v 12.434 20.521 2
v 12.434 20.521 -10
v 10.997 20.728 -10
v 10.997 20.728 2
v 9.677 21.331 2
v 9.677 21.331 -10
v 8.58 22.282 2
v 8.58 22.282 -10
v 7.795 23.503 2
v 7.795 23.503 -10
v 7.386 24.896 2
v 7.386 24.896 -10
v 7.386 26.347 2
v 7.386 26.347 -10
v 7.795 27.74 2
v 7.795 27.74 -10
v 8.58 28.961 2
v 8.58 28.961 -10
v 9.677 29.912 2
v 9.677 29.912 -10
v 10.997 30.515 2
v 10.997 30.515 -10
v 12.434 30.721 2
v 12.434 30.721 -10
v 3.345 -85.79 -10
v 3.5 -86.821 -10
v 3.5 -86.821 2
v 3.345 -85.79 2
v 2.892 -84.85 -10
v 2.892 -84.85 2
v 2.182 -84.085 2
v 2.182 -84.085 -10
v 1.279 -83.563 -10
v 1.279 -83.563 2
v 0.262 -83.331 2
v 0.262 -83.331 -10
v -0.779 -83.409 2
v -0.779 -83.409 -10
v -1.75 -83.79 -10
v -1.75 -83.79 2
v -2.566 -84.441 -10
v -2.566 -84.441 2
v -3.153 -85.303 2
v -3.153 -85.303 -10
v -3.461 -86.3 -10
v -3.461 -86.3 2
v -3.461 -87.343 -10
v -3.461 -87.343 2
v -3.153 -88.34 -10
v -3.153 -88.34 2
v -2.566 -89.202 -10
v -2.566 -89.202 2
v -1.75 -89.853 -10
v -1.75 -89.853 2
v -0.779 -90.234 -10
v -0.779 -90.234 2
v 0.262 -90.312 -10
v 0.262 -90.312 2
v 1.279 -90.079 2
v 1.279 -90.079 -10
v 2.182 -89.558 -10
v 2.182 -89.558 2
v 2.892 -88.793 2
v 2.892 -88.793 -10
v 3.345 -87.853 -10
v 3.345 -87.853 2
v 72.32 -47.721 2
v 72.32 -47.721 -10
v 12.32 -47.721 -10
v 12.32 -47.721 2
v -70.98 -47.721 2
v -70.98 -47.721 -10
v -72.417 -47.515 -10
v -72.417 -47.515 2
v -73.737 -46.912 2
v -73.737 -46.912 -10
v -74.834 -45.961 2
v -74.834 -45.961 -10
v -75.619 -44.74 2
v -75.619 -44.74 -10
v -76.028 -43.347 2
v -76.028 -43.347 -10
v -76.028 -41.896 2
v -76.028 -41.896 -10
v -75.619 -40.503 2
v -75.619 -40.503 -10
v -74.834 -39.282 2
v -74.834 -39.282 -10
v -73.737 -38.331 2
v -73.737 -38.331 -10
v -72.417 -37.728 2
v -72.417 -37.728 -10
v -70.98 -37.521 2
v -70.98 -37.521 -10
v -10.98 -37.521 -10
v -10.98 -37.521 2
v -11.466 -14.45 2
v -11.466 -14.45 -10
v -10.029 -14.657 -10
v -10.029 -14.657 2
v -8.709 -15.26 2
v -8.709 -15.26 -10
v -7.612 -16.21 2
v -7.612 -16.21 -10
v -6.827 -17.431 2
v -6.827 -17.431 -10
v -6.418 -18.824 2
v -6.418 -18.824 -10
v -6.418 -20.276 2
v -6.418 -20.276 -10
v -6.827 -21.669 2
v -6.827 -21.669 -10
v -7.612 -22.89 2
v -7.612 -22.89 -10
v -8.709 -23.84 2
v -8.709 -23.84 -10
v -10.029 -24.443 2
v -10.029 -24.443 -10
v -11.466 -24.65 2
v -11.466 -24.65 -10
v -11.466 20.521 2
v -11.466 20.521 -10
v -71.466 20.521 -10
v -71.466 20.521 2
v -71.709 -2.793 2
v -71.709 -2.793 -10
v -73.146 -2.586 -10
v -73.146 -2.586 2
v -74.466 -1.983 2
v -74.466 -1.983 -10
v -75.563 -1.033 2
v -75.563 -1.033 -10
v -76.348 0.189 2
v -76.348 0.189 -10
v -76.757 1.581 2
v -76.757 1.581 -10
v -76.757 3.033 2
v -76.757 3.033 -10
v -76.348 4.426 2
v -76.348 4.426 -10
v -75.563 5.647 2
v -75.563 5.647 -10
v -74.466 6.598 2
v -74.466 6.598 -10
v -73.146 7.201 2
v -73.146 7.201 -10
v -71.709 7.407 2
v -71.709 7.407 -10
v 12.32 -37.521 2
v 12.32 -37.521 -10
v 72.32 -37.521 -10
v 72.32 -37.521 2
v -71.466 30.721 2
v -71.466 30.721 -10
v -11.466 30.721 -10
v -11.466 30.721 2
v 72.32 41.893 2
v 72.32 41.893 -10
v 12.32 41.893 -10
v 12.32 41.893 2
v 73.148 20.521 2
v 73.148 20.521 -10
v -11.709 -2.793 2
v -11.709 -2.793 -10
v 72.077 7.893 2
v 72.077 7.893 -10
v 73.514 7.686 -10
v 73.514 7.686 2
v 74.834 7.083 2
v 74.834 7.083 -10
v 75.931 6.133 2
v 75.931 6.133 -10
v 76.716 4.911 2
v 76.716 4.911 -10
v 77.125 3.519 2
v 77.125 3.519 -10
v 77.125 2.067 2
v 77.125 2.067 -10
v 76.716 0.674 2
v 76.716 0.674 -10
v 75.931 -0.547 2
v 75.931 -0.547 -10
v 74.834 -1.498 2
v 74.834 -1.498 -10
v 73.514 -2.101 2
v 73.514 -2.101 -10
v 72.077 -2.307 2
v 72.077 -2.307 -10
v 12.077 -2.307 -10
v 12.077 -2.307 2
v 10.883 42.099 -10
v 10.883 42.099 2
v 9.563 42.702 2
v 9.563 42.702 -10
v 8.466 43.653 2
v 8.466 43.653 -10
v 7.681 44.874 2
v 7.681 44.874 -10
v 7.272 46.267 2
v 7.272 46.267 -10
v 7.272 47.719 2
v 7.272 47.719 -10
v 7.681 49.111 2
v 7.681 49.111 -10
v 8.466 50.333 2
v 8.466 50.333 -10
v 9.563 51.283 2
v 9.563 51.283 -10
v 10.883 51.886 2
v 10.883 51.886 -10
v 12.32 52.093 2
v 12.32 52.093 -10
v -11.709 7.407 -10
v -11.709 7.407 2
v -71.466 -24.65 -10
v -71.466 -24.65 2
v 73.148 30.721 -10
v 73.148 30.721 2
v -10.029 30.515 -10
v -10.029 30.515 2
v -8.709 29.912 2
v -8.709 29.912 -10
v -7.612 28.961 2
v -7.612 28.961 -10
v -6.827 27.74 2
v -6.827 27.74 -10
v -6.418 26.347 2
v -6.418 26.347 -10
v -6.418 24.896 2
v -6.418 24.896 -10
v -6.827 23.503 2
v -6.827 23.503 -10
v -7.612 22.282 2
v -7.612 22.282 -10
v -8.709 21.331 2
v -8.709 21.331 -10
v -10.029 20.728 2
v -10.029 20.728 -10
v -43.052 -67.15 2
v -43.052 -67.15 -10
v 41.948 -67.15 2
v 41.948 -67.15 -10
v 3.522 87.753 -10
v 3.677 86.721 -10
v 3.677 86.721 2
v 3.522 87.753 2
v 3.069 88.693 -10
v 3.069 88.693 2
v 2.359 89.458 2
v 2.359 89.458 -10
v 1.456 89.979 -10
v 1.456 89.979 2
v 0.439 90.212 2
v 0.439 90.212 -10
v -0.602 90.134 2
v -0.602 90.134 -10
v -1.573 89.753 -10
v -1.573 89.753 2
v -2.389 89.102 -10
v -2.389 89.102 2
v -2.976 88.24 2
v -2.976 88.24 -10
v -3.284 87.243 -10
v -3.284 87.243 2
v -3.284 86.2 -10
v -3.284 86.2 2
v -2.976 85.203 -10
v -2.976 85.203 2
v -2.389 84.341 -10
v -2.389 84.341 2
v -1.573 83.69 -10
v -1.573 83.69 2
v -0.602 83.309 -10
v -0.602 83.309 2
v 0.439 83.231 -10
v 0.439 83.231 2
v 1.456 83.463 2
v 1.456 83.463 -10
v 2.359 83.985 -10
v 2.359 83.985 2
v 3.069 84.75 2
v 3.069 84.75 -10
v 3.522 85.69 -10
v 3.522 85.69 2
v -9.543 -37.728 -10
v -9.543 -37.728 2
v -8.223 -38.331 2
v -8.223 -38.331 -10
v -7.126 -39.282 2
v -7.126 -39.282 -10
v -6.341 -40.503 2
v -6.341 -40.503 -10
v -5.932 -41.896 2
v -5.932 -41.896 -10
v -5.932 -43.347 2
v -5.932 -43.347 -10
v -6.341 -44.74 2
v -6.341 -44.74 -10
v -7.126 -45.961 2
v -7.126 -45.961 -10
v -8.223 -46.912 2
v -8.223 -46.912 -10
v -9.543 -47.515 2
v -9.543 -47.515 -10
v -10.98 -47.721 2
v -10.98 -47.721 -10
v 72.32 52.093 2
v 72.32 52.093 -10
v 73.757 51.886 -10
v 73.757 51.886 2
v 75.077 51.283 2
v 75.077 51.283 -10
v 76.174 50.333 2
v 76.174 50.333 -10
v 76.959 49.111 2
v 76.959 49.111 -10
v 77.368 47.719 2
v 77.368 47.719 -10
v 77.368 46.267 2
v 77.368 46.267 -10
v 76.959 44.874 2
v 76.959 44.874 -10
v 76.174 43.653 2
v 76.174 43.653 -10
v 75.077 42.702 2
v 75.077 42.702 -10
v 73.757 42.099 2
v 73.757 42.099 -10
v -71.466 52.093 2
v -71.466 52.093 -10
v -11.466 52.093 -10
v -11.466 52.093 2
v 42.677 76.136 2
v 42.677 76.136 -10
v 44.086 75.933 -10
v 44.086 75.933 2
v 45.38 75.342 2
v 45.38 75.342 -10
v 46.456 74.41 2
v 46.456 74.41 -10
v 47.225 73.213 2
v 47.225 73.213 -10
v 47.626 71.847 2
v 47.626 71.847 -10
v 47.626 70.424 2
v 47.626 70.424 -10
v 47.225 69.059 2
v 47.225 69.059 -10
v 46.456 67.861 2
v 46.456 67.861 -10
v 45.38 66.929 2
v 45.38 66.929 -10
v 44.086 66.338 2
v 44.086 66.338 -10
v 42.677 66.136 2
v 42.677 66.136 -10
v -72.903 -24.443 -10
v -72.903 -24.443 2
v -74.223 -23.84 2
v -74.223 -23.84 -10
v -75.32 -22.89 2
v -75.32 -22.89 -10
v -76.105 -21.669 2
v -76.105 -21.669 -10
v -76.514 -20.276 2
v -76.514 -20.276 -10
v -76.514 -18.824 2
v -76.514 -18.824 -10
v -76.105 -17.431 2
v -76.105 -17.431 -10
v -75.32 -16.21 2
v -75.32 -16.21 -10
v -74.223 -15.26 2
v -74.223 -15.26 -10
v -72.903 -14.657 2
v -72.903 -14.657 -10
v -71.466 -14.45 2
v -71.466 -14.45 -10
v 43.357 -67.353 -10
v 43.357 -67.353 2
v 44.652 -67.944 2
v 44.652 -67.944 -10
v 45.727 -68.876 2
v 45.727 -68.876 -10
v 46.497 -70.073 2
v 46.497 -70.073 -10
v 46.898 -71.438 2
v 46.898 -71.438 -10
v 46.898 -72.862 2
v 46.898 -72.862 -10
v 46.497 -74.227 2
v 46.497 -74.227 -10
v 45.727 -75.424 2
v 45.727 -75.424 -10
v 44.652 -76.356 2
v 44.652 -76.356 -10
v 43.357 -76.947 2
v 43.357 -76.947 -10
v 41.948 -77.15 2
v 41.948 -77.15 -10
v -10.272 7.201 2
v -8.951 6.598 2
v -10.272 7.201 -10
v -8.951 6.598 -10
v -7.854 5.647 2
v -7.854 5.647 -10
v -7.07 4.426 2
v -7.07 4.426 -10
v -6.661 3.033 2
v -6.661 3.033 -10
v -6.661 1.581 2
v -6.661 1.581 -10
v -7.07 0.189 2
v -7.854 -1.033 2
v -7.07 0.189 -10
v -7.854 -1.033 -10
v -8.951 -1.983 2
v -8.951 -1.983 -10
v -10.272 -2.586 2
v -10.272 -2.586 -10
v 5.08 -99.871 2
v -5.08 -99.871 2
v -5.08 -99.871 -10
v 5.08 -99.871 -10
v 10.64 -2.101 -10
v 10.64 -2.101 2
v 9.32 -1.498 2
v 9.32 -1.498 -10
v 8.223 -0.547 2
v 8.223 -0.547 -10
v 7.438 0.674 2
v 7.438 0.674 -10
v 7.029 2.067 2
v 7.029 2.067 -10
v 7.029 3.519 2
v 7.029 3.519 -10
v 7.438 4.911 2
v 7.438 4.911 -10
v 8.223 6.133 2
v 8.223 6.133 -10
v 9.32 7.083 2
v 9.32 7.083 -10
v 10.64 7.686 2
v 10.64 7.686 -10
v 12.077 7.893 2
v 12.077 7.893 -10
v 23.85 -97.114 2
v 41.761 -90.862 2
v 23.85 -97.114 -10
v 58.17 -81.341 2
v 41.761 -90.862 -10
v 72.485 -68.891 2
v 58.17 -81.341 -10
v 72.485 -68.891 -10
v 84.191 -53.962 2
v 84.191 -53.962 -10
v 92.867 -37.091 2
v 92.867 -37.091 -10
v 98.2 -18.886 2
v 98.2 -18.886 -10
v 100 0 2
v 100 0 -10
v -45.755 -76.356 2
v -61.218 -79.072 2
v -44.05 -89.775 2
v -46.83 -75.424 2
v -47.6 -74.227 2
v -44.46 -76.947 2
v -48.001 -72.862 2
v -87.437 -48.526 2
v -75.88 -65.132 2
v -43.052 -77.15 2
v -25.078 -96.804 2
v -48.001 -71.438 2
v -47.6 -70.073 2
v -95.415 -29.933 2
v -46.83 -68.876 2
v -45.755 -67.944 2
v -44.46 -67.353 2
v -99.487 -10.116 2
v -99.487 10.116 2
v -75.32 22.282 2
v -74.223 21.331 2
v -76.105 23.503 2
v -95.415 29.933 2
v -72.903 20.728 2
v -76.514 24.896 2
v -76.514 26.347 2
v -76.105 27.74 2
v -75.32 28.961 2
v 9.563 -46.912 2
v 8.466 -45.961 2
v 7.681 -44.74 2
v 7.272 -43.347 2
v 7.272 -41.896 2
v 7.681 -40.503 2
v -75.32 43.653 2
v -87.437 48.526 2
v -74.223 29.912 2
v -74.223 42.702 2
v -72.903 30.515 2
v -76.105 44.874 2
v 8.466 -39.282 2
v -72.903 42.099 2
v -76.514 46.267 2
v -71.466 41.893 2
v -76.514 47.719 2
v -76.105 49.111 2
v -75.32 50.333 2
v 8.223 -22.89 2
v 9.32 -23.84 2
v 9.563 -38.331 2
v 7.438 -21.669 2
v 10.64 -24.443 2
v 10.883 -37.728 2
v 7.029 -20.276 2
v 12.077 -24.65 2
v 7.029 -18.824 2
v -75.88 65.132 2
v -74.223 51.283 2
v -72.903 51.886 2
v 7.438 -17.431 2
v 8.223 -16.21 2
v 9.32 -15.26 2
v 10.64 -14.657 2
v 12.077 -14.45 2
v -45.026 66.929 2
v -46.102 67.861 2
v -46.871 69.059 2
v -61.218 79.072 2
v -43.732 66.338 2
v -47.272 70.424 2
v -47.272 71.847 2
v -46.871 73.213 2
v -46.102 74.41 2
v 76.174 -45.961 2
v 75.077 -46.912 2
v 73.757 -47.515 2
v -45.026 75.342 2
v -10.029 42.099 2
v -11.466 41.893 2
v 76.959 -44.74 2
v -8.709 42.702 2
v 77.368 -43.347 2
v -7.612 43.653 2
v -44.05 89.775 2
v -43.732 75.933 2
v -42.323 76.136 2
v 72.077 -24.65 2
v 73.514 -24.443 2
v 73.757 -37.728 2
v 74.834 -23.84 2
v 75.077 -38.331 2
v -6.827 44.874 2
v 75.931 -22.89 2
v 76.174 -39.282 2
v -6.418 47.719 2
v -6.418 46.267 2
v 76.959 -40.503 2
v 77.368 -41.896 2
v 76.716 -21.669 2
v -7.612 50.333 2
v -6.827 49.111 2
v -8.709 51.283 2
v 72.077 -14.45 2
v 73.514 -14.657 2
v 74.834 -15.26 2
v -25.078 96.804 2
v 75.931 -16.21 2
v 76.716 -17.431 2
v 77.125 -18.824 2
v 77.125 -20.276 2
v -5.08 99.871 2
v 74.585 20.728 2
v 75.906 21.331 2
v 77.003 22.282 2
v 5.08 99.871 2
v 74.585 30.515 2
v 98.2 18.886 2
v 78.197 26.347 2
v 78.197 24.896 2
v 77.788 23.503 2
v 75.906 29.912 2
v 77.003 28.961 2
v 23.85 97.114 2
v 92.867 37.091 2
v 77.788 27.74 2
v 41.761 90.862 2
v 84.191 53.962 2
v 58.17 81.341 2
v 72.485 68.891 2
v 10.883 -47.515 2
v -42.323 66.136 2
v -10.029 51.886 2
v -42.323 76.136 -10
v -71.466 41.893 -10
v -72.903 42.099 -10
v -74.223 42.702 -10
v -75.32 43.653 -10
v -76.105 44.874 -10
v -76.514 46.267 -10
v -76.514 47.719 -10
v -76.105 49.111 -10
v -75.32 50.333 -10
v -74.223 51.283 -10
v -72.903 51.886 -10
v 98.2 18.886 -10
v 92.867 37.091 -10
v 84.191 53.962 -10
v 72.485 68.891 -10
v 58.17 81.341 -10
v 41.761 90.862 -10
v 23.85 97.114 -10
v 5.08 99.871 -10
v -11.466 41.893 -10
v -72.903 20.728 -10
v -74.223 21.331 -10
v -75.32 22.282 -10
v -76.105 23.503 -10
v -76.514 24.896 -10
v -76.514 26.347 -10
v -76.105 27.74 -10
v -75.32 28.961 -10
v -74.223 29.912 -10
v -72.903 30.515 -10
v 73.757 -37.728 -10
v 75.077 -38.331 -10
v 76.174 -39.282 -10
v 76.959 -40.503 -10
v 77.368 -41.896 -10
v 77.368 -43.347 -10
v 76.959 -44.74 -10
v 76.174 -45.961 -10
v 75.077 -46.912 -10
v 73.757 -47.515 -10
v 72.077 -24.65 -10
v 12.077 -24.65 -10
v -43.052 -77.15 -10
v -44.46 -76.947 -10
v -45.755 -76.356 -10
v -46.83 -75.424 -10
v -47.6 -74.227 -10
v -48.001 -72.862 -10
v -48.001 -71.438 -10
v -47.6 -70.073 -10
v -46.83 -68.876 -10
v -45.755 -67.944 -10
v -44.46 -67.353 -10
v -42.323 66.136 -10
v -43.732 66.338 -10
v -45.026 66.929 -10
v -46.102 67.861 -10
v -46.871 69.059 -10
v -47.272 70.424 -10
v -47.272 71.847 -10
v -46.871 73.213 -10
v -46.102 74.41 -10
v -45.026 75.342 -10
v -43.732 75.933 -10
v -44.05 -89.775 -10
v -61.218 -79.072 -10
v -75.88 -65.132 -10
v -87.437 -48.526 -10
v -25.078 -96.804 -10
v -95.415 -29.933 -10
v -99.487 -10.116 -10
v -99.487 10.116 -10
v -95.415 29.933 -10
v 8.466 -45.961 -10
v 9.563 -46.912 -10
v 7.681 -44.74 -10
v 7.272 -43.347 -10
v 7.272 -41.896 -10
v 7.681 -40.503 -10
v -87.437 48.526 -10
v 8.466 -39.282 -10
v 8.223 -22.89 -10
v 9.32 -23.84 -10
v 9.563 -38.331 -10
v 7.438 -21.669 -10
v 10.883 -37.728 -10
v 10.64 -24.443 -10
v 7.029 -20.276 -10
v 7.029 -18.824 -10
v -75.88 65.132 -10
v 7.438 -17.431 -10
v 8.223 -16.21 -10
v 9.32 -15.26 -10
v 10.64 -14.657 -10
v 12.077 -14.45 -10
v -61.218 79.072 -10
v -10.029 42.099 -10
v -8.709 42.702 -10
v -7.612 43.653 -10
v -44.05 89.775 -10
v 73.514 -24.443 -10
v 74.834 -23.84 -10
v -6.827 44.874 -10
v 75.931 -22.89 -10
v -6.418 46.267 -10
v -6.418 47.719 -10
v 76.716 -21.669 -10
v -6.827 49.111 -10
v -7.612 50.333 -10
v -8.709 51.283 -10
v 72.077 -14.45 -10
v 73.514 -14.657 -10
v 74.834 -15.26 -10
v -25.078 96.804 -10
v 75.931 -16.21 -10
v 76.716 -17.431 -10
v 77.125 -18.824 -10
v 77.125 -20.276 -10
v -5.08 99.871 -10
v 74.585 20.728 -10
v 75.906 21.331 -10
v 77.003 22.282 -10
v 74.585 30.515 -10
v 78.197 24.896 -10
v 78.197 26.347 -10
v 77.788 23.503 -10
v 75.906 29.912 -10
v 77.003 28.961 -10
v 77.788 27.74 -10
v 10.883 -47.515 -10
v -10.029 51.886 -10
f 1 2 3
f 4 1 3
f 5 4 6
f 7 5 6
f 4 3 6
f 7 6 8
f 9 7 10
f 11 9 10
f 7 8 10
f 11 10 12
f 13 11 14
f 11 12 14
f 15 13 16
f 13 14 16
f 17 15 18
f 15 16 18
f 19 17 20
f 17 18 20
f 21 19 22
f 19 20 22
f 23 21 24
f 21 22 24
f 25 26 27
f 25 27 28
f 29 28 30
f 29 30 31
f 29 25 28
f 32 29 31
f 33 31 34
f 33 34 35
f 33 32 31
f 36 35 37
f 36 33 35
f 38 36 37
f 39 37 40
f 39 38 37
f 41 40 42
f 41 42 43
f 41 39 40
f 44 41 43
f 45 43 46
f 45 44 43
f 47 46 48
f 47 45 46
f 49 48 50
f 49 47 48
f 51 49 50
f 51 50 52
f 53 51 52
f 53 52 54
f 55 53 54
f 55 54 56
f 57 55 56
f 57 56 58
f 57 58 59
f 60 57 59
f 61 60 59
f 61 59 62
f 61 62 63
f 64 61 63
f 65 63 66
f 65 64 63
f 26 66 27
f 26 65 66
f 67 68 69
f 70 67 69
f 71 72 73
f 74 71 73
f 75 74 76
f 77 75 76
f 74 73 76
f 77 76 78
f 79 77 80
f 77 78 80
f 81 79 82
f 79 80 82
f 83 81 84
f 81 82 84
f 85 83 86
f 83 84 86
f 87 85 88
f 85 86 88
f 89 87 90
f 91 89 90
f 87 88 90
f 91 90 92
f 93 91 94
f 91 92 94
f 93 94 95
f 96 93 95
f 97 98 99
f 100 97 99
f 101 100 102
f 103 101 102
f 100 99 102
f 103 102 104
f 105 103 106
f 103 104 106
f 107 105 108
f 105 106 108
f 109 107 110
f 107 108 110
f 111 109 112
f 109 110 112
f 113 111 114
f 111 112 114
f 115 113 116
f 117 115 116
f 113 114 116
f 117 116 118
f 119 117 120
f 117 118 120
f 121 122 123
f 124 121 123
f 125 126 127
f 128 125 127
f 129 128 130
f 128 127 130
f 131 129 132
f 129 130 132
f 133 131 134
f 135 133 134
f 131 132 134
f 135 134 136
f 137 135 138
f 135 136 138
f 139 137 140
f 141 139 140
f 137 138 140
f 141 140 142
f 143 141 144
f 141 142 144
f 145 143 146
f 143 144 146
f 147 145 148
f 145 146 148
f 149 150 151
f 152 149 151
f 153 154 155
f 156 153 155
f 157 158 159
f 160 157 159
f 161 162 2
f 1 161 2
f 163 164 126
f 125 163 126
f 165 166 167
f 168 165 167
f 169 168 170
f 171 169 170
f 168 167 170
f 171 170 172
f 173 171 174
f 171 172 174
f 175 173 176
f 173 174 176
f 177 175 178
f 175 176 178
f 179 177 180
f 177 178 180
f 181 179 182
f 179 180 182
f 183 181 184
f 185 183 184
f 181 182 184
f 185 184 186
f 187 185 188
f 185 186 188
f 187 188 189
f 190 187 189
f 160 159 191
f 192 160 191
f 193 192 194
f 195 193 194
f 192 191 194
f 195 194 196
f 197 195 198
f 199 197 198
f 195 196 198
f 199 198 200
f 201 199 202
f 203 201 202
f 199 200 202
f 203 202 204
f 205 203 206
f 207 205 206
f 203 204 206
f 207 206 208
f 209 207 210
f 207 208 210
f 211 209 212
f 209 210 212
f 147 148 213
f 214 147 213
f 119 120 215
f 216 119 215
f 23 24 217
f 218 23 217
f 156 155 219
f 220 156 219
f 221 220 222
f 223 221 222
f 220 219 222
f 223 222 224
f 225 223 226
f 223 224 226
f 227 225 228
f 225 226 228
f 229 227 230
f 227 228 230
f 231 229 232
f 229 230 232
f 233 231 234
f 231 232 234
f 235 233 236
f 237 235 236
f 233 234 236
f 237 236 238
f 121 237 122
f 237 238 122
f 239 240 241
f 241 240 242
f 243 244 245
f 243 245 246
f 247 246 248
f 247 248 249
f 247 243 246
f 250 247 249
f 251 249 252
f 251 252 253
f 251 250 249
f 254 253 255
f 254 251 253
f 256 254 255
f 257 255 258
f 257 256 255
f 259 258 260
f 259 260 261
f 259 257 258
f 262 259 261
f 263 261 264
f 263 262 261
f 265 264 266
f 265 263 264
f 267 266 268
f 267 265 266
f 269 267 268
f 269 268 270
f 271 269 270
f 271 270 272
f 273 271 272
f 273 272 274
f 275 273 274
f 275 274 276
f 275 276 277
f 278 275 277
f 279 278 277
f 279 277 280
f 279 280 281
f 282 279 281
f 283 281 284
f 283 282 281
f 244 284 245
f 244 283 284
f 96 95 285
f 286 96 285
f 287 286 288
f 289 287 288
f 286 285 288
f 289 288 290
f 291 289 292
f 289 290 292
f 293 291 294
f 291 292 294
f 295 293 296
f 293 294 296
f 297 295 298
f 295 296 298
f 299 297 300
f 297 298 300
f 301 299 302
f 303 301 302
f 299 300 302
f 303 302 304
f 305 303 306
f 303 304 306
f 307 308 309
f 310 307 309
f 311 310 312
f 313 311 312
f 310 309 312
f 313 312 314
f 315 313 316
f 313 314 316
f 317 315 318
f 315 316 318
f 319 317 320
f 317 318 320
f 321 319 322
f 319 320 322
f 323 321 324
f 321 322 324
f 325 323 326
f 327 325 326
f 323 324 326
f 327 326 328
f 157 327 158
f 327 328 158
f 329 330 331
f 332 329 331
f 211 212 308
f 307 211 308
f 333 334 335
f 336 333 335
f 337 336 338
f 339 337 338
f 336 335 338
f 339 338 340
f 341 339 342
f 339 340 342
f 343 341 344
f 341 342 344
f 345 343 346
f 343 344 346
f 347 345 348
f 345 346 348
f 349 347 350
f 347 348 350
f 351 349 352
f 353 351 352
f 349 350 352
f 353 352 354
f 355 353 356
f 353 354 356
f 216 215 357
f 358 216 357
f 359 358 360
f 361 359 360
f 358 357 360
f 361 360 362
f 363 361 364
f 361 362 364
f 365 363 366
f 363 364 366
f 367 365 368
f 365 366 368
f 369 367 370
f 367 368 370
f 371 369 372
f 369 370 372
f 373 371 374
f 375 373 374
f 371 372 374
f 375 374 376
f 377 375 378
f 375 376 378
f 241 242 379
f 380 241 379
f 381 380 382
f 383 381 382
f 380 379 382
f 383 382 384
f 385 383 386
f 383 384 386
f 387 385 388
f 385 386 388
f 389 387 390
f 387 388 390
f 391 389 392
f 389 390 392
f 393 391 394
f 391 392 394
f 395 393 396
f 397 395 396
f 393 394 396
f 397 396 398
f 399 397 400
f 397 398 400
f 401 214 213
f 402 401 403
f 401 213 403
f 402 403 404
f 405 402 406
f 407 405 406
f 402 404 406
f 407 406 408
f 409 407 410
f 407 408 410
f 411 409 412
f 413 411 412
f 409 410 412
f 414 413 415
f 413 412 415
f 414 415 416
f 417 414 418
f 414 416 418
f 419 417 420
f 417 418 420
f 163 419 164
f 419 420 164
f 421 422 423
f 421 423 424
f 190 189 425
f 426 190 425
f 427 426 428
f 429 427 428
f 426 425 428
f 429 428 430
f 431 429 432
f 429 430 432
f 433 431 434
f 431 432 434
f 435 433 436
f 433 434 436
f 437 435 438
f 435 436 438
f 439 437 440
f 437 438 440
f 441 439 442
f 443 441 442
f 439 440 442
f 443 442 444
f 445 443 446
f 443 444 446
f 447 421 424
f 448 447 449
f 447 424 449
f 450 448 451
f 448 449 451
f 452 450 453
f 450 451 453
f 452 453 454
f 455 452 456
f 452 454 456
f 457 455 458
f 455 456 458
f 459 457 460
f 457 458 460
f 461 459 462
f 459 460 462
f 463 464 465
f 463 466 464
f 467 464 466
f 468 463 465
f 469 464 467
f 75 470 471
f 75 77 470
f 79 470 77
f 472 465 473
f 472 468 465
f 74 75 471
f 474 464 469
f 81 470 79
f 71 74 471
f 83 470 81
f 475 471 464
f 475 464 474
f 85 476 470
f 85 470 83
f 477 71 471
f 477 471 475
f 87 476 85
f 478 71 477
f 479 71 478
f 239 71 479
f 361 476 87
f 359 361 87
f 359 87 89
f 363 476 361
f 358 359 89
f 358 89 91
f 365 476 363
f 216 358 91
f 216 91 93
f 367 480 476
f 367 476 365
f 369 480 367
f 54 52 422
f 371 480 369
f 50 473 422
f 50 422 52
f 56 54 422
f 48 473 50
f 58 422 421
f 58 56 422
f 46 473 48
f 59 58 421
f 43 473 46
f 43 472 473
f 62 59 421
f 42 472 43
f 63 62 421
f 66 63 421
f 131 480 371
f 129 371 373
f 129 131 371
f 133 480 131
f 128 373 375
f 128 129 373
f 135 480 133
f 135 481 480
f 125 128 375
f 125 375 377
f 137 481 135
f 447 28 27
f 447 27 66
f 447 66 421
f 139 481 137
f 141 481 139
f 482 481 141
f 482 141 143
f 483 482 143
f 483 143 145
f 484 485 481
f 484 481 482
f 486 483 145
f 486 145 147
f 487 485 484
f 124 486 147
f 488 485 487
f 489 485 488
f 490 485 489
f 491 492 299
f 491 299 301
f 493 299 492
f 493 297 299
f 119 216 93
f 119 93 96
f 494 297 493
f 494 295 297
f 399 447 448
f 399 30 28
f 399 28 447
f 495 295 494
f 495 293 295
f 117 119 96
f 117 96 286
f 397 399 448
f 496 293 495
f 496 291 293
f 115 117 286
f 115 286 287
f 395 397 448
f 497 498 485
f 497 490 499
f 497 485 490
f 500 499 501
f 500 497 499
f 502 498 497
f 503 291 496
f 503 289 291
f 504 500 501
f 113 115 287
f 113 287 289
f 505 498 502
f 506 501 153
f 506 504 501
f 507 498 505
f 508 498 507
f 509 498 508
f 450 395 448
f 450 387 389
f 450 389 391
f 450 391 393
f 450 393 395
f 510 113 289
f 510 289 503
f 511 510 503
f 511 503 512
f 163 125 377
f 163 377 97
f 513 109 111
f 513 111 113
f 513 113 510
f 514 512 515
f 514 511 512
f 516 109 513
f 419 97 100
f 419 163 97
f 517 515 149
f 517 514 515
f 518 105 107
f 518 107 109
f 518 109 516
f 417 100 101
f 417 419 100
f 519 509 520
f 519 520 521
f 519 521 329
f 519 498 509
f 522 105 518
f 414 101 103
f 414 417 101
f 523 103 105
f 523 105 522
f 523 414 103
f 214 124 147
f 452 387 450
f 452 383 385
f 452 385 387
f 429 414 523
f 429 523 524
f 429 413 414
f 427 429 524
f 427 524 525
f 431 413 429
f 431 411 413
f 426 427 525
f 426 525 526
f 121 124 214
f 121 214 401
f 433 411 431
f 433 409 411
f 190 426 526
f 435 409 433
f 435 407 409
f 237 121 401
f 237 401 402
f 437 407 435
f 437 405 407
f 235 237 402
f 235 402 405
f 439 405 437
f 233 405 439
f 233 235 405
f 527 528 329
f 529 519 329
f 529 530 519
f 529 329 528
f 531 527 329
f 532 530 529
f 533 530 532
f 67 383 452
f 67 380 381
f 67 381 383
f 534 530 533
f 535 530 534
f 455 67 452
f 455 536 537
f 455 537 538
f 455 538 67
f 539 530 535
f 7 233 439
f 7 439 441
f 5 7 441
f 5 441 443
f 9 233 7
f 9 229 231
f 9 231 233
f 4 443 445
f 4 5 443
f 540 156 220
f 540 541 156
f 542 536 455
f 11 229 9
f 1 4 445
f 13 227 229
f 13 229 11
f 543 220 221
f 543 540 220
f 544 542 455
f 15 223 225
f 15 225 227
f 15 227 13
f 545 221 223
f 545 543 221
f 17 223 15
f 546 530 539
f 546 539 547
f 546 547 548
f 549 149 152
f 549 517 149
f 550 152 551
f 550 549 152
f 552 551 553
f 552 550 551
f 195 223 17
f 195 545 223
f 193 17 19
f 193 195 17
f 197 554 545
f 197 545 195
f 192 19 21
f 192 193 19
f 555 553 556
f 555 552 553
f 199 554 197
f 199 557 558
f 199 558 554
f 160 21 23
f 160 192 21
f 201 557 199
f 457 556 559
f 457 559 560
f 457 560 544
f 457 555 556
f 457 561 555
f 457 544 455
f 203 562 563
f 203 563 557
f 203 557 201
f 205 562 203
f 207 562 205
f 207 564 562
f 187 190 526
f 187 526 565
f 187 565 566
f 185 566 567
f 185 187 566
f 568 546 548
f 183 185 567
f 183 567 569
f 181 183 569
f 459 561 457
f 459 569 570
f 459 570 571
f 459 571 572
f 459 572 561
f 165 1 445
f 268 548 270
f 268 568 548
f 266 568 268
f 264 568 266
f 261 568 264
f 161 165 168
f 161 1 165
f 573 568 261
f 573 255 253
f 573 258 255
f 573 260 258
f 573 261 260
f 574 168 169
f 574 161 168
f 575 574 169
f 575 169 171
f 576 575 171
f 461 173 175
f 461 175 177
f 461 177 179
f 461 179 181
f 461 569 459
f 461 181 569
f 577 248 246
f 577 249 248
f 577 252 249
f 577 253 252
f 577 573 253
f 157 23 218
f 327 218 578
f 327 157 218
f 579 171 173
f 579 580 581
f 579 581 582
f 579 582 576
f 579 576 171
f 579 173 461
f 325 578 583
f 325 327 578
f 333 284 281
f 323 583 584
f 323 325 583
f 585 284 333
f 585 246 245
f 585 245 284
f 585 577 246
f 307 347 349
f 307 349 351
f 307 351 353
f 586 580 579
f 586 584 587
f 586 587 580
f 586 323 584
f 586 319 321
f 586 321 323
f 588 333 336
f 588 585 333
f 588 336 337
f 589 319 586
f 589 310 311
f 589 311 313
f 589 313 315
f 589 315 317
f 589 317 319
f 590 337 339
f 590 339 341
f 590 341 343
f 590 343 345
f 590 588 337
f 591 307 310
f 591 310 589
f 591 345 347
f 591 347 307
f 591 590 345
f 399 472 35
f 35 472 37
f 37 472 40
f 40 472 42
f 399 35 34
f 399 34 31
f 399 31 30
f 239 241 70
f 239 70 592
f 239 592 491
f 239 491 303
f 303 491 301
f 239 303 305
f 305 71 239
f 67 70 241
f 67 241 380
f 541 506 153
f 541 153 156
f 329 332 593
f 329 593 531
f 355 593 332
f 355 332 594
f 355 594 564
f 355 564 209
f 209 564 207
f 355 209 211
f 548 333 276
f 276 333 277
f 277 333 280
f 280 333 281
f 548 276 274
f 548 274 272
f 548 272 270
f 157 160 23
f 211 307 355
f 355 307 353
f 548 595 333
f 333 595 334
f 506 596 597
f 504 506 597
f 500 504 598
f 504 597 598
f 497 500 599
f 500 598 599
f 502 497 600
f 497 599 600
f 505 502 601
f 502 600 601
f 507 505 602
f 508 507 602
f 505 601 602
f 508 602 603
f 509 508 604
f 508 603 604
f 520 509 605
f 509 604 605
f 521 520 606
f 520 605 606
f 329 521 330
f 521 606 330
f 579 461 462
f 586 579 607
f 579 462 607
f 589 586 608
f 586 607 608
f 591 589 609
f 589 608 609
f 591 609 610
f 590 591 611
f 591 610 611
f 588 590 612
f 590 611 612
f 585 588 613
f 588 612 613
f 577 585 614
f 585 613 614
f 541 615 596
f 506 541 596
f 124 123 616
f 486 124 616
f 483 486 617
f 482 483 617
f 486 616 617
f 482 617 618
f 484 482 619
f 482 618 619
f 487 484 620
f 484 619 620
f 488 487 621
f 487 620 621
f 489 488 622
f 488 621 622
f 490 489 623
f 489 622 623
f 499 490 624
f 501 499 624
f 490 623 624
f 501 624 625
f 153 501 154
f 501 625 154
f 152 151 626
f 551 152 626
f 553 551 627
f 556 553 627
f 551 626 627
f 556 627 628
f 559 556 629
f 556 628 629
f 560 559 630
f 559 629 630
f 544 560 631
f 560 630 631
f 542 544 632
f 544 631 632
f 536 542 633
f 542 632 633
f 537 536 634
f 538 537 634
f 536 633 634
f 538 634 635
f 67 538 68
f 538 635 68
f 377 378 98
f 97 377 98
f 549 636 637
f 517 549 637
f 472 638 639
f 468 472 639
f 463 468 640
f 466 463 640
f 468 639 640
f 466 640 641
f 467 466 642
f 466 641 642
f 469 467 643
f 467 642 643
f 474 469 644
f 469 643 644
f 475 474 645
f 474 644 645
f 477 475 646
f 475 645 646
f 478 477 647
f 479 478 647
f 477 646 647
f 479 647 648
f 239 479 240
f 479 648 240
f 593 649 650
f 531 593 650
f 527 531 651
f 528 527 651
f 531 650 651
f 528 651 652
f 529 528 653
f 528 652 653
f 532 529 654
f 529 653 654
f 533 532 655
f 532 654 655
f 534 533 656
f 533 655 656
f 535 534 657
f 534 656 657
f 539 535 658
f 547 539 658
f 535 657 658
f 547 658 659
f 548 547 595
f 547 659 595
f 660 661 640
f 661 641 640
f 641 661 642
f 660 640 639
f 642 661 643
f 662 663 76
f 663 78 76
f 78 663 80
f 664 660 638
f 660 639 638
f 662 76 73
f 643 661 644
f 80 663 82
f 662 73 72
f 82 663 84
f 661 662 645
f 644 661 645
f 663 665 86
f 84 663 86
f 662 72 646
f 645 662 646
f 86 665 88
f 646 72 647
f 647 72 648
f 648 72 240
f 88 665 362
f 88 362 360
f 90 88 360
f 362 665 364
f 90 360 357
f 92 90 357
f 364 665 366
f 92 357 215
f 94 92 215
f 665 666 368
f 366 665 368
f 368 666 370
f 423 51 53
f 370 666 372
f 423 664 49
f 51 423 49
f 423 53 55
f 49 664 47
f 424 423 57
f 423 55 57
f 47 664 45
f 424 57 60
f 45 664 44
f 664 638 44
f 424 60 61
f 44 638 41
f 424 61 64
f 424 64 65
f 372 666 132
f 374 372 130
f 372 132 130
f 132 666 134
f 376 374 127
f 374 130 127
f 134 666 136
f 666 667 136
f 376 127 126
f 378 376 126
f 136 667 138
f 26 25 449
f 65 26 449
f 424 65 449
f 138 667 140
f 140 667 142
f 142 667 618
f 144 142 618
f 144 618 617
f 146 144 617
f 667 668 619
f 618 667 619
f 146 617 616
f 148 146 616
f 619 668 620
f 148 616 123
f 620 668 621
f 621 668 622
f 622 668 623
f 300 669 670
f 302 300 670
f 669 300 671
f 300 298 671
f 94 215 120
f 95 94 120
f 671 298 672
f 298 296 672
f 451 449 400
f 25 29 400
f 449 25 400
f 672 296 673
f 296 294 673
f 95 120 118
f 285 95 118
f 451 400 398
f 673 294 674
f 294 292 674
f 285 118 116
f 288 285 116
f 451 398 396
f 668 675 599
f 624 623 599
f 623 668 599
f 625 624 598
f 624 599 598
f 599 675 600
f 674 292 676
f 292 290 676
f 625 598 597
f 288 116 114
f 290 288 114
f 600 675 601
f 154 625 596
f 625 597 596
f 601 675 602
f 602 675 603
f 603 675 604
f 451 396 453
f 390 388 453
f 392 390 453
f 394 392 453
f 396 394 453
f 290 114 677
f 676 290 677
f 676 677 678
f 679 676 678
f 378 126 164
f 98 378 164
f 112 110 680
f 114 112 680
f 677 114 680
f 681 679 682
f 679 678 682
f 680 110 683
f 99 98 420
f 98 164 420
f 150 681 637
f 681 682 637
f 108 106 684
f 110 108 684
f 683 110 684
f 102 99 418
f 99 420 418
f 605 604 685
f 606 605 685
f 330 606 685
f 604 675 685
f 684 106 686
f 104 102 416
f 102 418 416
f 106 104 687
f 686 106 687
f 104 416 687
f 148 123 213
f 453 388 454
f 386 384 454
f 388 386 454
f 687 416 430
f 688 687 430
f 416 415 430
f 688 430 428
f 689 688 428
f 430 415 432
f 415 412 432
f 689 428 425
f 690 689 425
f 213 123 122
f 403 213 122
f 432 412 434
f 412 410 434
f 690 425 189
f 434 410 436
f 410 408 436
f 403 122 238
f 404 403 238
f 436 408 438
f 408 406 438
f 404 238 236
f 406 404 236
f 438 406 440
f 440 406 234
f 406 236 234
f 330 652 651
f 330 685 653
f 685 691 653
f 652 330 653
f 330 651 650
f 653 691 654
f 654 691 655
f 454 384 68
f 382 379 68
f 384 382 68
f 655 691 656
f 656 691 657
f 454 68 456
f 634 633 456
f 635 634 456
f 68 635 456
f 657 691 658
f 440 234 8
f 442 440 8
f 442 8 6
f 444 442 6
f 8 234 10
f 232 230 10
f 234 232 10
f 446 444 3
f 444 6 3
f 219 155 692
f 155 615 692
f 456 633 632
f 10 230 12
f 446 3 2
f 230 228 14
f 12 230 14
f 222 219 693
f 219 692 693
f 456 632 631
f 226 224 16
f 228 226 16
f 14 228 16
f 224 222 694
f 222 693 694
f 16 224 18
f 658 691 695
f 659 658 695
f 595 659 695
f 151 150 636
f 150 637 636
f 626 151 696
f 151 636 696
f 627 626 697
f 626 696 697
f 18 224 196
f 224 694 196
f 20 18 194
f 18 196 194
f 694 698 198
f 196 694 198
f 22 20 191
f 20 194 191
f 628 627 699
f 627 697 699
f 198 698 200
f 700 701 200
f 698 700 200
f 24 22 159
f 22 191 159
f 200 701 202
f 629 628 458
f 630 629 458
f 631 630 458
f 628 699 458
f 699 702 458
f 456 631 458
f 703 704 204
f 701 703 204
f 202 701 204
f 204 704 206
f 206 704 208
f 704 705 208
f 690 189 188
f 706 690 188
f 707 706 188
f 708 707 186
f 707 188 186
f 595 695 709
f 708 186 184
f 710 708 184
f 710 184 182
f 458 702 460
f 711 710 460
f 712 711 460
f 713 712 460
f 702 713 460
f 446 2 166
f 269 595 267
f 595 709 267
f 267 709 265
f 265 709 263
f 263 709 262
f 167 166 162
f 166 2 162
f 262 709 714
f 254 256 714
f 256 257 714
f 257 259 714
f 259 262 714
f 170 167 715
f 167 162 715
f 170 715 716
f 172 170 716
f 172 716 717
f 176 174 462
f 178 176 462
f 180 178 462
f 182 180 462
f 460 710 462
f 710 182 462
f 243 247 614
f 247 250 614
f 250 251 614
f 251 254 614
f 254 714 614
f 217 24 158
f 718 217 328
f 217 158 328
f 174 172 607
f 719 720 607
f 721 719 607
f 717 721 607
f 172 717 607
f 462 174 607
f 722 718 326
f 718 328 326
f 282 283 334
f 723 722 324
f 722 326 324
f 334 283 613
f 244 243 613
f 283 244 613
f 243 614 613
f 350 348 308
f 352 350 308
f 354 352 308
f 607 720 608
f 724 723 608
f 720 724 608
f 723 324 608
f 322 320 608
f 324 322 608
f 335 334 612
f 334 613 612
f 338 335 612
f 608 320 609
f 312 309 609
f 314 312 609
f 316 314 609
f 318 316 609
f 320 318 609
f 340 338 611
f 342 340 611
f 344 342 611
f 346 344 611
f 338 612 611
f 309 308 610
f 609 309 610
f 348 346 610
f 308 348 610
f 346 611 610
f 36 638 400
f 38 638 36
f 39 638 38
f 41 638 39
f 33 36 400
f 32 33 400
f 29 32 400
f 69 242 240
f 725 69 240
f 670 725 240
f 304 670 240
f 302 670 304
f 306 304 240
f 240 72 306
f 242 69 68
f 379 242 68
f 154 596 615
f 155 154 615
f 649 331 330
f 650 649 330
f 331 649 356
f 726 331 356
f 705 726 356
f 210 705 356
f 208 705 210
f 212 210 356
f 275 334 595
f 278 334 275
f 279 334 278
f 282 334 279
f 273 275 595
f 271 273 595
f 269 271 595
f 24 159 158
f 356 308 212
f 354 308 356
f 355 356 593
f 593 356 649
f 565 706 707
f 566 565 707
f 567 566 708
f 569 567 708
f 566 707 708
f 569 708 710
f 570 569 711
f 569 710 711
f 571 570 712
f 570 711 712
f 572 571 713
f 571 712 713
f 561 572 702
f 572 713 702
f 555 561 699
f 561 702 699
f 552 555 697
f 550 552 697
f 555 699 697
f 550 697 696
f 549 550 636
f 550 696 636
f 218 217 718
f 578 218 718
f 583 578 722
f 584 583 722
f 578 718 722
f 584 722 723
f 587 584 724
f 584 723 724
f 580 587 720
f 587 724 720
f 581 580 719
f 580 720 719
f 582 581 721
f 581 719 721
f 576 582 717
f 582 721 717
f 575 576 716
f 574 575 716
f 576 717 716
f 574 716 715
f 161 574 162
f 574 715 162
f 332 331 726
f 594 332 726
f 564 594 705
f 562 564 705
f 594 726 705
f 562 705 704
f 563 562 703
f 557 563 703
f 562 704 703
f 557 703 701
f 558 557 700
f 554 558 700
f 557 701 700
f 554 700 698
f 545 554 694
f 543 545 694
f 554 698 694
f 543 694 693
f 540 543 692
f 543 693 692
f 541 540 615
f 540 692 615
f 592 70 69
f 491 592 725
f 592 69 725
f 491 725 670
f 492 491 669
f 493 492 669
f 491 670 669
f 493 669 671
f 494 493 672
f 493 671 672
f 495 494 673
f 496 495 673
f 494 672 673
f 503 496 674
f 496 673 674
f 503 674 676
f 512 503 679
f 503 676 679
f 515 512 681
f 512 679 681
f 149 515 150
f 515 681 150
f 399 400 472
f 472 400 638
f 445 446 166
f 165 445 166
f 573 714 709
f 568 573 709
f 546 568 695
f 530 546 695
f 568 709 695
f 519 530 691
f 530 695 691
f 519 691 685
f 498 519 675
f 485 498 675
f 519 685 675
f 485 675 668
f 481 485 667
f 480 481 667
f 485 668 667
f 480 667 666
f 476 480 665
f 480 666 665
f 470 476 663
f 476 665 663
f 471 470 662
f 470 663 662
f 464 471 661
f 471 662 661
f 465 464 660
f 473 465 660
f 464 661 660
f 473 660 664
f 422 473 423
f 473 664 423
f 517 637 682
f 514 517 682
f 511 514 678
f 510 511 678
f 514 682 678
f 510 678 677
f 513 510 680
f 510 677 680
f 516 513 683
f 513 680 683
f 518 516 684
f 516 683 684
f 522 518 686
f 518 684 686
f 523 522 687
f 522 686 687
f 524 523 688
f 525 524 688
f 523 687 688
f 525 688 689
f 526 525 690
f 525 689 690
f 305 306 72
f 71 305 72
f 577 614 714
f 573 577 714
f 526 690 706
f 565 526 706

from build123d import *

# Parameters (mm, degrees)
SALIENTE_EXTRUIR1_DEPTH      = 2
SALIENTE_EXTRUIR1_DEPTH_BACK = 10
CROQUIS1_R                   = 3.5


with BuildPart() as part:
    # Croquis1 → Saliente-Extruir1 (new, two sides: drawn at the far end of the back side and taken through both)
    with BuildSketch(Plane.XY.offset(-SALIENTE_EXTRUIR1_DEPTH_BACK)):
        with BuildLine():
            ThreePointArc((-5.08027052, 99.870870886), (-100, 0), (-5.08027052, -99.870870886))
            Line((-5.08027052, -99.870870886), (5.08027052, -99.870870886))
            ThreePointArc((5.08027052, -99.870870886), (72.4845744, -68.891120429), (100, 0))
            ThreePointArc((100, 0), (72.4845744, 68.891120429), (5.08027052, 99.870870886))
            Line((5.08027052, 99.870870886), (-5.08027052, 99.870870886))
        make_face()
        with BuildLine():
            ThreePointArc((-43.051560295, -77.15), (-48.051560295, -72.15), (-43.051560295, -67.15))
            Line((-43.051560295, -67.15), (41.948439705, -67.15))
            ThreePointArc((41.948439705, -67.15), (46.948439705, -72.15), (41.948439705, -77.15))
            Line((41.948439705, -77.15), (-43.051560295, -77.15))
        make_face(mode=Mode.SUBTRACT)
        with BuildLine():
            ThreePointArc((-70.980131723, -47.721428571), (-76.080131723, -42.621428571), (-70.980131723, -37.521428571))
            Line((-70.980131723, -37.521428571), (-10.980131723, -37.521428571))
            ThreePointArc((-10.980131723, -37.521428571), (-5.880131723, -42.621428571), (-10.980131723, -47.721428571))
            Line((-10.980131723, -47.721428571), (-70.980131723, -47.721428571))
        make_face(mode=Mode.SUBTRACT)
        with BuildLine():
            ThreePointArc((-71.465846009, -24.65), (-76.565846009, -19.55), (-71.465846009, -14.45))
            Line((-71.465846009, -14.45), (-11.465846009, -14.45))
            ThreePointArc((-11.465846009, -14.45), (-6.365846009, -19.55), (-11.465846009, -24.65))
            Line((-11.465846009, -24.65), (-71.465846009, -24.65))
        make_face(mode=Mode.SUBTRACT)
        with Locations((0, -86.821428571)):
            Circle(CROQUIS1_R, mode=Mode.SUBTRACT)
        with BuildLine():
            ThreePointArc((12.319868277, -47.721428571), (7.219868277, -42.621428571), (12.319868277, -37.521428571))
            Line((12.319868277, -37.521428571), (72.319868277, -37.521428571))
            ThreePointArc((72.319868277, -37.521428571), (77.419868277, -42.621428571), (72.319868277, -47.721428571))
            Line((72.319868277, -47.721428571), (12.319868277, -47.721428571))
        make_face(mode=Mode.SUBTRACT)
        with BuildLine():
            ThreePointArc((12.077011134, -24.65), (6.977011134, -19.55), (12.077011134, -14.45))
            Line((12.077011134, -14.45), (72.077011134, -14.45))
            ThreePointArc((72.077011134, -14.45), (77.177011134, -19.55), (72.077011134, -24.65))
            Line((72.077011134, -24.65), (12.077011134, -24.65))
        make_face(mode=Mode.SUBTRACT)
        with BuildLine():
            ThreePointArc((-71.708703152, -2.792857143), (-76.808703152, 2.307142857), (-71.708703152, 7.407142857))
            Line((-71.708703152, 7.407142857), (-11.708703152, 7.407142857))
            ThreePointArc((-11.708703152, 7.407142857), (-6.608703152, 2.307142857), (-11.708703152, -2.792857143))
            Line((-11.708703152, -2.792857143), (-71.708703152, -2.792857143))
        make_face(mode=Mode.SUBTRACT)
        with BuildLine():
            ThreePointArc((-71.465846009, 20.521428571), (-76.565846009, 25.621428571), (-71.465846009, 30.721428571))
            Line((-71.465846009, 30.721428571), (-11.465846009, 30.721428571))
            ThreePointArc((-11.465846009, 30.721428571), (-6.365846009, 25.621428571), (-11.465846009, 20.521428571))
            Line((-11.465846009, 20.521428571), (-71.465846009, 20.521428571))
        make_face(mode=Mode.SUBTRACT)
        with BuildLine():
            ThreePointArc((-71.465846009, 41.892857143), (-76.565846009, 46.992857143), (-71.465846009, 52.092857143))
            Line((-71.465846009, 52.092857143), (-11.465846009, 52.092857143))
            ThreePointArc((-11.465846009, 52.092857143), (-6.365846009, 46.992857143), (-11.465846009, 41.892857143))
            Line((-11.465846009, 41.892857143), (-71.465846009, 41.892857143))
        make_face(mode=Mode.SUBTRACT)
        with BuildLine():
            ThreePointArc((12.077011134, -2.307142857), (6.977011134, 2.792857143), (12.077011134, 7.892857143))
            Line((12.077011134, 7.892857143), (72.077011134, 7.892857143))
            ThreePointArc((72.077011134, 7.892857143), (77.177011134, 2.792857143), (72.077011134, -2.307142857))
            Line((72.077011134, -2.307142857), (12.077011134, -2.307142857))
        make_face(mode=Mode.SUBTRACT)
        with BuildLine():
            ThreePointArc((12.434153991, 20.521428571), (7.334153991, 25.621428571), (12.434153991, 30.721428571))
            Line((12.434153991, 30.721428571), (73.148439705, 30.721428571))
            ThreePointArc((73.148439705, 30.721428571), (78.248439705, 25.621428571), (73.148439705, 20.521428571))
            Line((73.148439705, 20.521428571), (12.434153991, 20.521428571))
        make_face(mode=Mode.SUBTRACT)
        with BuildLine():
            ThreePointArc((12.319868277, 41.892857143), (7.219868277, 46.992857143), (12.319868277, 52.092857143))
            Line((12.319868277, 52.092857143), (72.319868277, 52.092857143))
            ThreePointArc((72.319868277, 52.092857143), (77.419868277, 46.992857143), (72.319868277, 41.892857143))
            Line((72.319868277, 41.892857143), (12.319868277, 41.892857143))
        make_face(mode=Mode.SUBTRACT)
        with BuildLine():
            ThreePointArc((-42.322988866, 66.135714286), (-47.322988866, 71.135714286), (-42.322988866, 76.135714286))
            Line((-42.322988866, 76.135714286), (42.677011134, 76.135714286))
            ThreePointArc((42.677011134, 76.135714286), (47.677011134, 71.135714286), (42.677011134, 66.135714286))
            Line((42.677011134, 66.135714286), (-42.322988866, 66.135714286))
        make_face(mode=Mode.SUBTRACT)
        with Locations((0.177011134, 86.721428571)):
            Circle(CROQUIS1_R, mode=Mode.SUBTRACT)
    extrude(amount=SALIENTE_EXTRUIR1_DEPTH + SALIENTE_EXTRUIR1_DEPTH_BACK)


solid = part.part
